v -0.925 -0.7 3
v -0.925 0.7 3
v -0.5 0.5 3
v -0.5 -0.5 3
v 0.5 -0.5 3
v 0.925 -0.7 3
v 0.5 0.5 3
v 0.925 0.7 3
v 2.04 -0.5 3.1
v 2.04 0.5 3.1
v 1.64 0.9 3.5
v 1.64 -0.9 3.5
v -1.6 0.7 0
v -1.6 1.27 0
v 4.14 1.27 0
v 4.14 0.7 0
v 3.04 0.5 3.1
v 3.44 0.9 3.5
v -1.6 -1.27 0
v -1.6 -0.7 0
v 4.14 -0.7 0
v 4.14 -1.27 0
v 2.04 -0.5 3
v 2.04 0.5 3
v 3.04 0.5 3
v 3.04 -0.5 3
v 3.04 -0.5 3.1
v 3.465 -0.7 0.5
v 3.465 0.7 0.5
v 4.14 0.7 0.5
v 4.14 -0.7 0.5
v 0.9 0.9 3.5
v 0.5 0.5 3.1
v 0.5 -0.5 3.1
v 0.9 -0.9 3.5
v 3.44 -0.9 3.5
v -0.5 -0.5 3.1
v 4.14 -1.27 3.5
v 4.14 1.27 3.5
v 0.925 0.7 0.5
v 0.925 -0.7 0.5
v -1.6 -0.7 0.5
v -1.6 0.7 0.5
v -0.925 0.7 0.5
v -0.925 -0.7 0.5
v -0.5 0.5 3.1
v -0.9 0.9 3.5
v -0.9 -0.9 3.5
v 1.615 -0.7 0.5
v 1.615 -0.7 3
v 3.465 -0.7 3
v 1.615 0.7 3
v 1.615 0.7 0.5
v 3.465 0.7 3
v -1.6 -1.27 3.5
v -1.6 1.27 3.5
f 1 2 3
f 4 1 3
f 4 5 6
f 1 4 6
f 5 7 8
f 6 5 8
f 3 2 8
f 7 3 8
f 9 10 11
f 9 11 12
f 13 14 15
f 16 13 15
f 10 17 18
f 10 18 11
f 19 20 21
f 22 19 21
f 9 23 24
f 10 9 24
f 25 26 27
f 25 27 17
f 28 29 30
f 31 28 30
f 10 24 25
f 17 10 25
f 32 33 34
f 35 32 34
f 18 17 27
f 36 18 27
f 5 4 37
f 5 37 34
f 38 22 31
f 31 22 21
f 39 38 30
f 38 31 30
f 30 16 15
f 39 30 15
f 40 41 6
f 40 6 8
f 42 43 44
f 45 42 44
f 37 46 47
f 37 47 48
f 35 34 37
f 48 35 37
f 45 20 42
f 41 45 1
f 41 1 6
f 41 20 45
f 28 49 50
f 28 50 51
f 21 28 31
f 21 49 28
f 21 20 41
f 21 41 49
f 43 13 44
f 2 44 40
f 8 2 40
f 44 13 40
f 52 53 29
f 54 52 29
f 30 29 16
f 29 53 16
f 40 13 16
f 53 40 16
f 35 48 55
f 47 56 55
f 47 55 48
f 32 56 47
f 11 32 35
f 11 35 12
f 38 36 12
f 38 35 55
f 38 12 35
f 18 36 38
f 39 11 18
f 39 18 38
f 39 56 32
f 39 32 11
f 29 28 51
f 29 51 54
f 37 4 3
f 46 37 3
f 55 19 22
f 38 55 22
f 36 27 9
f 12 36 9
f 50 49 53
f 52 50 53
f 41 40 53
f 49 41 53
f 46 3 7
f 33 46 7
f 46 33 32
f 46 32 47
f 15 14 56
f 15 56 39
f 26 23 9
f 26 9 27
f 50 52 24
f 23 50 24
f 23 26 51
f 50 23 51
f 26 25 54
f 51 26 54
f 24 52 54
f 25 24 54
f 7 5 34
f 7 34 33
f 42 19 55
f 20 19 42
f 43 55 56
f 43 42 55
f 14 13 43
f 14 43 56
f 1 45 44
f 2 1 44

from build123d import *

# Parameters (mm, degrees)
SKETCH007_W      = 1
SKETCH007_H      = 1
EXTRUDE007_DEPTH = 9
SKETCH006_W      = 1.85
SKETCH006_H      = 1.4
EXTRUDE016_DEPTH = 3
SKETCH003_W      = 4
SKETCH003_H      = 1.4
EXTRUDE003_DEPTH = 0.5
SKETCH_W         = 3.2
SKETCH_H         = 2.54
EXTRUDE017_DEPTH = 3.5
CHAMFER005_SIZE  = 0.4
ARRAY010_X_COUNT = 2
ARRAY010_X_PITCH = 2.54


with BuildPart() as extrude007:
    # Sketch007 → Extrude007 (new body)
    with BuildSketch(Plane.XY):
        Rectangle(SKETCH007_W, SKETCH007_H)
    extrude(amount=EXTRUDE007_DEPTH)


with BuildPart() as extrude016:
    # Sketch006 → Extrude016 (new body)
    with BuildSketch(Plane.XY):
        Rectangle(SKETCH006_W, SKETCH006_H)
    extrude(amount=EXTRUDE016_DEPTH)


with BuildPart() as fusion012:
    # Sketch003 → Extrude003 (new body)
    with BuildSketch(Plane.XY):
        Rectangle(SKETCH003_W, SKETCH003_H)
    extrude(amount=EXTRUDE003_DEPTH)

    # Fusion012: union Extrude007, Extrude016
    add(extrude007.part)
    add(extrude016.part)


with BuildPart() as array010:
    # Sketch → Extrude017 (new body)
    with BuildSketch(Plane.XY):
        Rectangle(SKETCH_W, SKETCH_H)
    extrude(amount=EXTRUDE017_DEPTH)

    # Cut005: cut Fusion012
    add(fusion012.part, mode=Mode.SUBTRACT)

    # Chamfer005
    chamfer005_edges = [array010.edges().sort_by_distance(p)[0] for p in [
        (0, 0.5, 3.5),
        (-0.5, 0, 3.5),
        (0, -0.5, 3.5),
        (0.5, 0, 3.5),
    ]]
    chamfer(chamfer005_edges, length=CHAMFER005_SIZE)

    # Array010 X: Array010 ×2


with BuildPart() as array010_1:
    add(array010.part)
    with Locations(*[(i * ARRAY010_X_PITCH, 0, 0) for i in range(1, ARRAY010_X_COUNT)]):
        add(array010.part)


solid = array010_1.part
